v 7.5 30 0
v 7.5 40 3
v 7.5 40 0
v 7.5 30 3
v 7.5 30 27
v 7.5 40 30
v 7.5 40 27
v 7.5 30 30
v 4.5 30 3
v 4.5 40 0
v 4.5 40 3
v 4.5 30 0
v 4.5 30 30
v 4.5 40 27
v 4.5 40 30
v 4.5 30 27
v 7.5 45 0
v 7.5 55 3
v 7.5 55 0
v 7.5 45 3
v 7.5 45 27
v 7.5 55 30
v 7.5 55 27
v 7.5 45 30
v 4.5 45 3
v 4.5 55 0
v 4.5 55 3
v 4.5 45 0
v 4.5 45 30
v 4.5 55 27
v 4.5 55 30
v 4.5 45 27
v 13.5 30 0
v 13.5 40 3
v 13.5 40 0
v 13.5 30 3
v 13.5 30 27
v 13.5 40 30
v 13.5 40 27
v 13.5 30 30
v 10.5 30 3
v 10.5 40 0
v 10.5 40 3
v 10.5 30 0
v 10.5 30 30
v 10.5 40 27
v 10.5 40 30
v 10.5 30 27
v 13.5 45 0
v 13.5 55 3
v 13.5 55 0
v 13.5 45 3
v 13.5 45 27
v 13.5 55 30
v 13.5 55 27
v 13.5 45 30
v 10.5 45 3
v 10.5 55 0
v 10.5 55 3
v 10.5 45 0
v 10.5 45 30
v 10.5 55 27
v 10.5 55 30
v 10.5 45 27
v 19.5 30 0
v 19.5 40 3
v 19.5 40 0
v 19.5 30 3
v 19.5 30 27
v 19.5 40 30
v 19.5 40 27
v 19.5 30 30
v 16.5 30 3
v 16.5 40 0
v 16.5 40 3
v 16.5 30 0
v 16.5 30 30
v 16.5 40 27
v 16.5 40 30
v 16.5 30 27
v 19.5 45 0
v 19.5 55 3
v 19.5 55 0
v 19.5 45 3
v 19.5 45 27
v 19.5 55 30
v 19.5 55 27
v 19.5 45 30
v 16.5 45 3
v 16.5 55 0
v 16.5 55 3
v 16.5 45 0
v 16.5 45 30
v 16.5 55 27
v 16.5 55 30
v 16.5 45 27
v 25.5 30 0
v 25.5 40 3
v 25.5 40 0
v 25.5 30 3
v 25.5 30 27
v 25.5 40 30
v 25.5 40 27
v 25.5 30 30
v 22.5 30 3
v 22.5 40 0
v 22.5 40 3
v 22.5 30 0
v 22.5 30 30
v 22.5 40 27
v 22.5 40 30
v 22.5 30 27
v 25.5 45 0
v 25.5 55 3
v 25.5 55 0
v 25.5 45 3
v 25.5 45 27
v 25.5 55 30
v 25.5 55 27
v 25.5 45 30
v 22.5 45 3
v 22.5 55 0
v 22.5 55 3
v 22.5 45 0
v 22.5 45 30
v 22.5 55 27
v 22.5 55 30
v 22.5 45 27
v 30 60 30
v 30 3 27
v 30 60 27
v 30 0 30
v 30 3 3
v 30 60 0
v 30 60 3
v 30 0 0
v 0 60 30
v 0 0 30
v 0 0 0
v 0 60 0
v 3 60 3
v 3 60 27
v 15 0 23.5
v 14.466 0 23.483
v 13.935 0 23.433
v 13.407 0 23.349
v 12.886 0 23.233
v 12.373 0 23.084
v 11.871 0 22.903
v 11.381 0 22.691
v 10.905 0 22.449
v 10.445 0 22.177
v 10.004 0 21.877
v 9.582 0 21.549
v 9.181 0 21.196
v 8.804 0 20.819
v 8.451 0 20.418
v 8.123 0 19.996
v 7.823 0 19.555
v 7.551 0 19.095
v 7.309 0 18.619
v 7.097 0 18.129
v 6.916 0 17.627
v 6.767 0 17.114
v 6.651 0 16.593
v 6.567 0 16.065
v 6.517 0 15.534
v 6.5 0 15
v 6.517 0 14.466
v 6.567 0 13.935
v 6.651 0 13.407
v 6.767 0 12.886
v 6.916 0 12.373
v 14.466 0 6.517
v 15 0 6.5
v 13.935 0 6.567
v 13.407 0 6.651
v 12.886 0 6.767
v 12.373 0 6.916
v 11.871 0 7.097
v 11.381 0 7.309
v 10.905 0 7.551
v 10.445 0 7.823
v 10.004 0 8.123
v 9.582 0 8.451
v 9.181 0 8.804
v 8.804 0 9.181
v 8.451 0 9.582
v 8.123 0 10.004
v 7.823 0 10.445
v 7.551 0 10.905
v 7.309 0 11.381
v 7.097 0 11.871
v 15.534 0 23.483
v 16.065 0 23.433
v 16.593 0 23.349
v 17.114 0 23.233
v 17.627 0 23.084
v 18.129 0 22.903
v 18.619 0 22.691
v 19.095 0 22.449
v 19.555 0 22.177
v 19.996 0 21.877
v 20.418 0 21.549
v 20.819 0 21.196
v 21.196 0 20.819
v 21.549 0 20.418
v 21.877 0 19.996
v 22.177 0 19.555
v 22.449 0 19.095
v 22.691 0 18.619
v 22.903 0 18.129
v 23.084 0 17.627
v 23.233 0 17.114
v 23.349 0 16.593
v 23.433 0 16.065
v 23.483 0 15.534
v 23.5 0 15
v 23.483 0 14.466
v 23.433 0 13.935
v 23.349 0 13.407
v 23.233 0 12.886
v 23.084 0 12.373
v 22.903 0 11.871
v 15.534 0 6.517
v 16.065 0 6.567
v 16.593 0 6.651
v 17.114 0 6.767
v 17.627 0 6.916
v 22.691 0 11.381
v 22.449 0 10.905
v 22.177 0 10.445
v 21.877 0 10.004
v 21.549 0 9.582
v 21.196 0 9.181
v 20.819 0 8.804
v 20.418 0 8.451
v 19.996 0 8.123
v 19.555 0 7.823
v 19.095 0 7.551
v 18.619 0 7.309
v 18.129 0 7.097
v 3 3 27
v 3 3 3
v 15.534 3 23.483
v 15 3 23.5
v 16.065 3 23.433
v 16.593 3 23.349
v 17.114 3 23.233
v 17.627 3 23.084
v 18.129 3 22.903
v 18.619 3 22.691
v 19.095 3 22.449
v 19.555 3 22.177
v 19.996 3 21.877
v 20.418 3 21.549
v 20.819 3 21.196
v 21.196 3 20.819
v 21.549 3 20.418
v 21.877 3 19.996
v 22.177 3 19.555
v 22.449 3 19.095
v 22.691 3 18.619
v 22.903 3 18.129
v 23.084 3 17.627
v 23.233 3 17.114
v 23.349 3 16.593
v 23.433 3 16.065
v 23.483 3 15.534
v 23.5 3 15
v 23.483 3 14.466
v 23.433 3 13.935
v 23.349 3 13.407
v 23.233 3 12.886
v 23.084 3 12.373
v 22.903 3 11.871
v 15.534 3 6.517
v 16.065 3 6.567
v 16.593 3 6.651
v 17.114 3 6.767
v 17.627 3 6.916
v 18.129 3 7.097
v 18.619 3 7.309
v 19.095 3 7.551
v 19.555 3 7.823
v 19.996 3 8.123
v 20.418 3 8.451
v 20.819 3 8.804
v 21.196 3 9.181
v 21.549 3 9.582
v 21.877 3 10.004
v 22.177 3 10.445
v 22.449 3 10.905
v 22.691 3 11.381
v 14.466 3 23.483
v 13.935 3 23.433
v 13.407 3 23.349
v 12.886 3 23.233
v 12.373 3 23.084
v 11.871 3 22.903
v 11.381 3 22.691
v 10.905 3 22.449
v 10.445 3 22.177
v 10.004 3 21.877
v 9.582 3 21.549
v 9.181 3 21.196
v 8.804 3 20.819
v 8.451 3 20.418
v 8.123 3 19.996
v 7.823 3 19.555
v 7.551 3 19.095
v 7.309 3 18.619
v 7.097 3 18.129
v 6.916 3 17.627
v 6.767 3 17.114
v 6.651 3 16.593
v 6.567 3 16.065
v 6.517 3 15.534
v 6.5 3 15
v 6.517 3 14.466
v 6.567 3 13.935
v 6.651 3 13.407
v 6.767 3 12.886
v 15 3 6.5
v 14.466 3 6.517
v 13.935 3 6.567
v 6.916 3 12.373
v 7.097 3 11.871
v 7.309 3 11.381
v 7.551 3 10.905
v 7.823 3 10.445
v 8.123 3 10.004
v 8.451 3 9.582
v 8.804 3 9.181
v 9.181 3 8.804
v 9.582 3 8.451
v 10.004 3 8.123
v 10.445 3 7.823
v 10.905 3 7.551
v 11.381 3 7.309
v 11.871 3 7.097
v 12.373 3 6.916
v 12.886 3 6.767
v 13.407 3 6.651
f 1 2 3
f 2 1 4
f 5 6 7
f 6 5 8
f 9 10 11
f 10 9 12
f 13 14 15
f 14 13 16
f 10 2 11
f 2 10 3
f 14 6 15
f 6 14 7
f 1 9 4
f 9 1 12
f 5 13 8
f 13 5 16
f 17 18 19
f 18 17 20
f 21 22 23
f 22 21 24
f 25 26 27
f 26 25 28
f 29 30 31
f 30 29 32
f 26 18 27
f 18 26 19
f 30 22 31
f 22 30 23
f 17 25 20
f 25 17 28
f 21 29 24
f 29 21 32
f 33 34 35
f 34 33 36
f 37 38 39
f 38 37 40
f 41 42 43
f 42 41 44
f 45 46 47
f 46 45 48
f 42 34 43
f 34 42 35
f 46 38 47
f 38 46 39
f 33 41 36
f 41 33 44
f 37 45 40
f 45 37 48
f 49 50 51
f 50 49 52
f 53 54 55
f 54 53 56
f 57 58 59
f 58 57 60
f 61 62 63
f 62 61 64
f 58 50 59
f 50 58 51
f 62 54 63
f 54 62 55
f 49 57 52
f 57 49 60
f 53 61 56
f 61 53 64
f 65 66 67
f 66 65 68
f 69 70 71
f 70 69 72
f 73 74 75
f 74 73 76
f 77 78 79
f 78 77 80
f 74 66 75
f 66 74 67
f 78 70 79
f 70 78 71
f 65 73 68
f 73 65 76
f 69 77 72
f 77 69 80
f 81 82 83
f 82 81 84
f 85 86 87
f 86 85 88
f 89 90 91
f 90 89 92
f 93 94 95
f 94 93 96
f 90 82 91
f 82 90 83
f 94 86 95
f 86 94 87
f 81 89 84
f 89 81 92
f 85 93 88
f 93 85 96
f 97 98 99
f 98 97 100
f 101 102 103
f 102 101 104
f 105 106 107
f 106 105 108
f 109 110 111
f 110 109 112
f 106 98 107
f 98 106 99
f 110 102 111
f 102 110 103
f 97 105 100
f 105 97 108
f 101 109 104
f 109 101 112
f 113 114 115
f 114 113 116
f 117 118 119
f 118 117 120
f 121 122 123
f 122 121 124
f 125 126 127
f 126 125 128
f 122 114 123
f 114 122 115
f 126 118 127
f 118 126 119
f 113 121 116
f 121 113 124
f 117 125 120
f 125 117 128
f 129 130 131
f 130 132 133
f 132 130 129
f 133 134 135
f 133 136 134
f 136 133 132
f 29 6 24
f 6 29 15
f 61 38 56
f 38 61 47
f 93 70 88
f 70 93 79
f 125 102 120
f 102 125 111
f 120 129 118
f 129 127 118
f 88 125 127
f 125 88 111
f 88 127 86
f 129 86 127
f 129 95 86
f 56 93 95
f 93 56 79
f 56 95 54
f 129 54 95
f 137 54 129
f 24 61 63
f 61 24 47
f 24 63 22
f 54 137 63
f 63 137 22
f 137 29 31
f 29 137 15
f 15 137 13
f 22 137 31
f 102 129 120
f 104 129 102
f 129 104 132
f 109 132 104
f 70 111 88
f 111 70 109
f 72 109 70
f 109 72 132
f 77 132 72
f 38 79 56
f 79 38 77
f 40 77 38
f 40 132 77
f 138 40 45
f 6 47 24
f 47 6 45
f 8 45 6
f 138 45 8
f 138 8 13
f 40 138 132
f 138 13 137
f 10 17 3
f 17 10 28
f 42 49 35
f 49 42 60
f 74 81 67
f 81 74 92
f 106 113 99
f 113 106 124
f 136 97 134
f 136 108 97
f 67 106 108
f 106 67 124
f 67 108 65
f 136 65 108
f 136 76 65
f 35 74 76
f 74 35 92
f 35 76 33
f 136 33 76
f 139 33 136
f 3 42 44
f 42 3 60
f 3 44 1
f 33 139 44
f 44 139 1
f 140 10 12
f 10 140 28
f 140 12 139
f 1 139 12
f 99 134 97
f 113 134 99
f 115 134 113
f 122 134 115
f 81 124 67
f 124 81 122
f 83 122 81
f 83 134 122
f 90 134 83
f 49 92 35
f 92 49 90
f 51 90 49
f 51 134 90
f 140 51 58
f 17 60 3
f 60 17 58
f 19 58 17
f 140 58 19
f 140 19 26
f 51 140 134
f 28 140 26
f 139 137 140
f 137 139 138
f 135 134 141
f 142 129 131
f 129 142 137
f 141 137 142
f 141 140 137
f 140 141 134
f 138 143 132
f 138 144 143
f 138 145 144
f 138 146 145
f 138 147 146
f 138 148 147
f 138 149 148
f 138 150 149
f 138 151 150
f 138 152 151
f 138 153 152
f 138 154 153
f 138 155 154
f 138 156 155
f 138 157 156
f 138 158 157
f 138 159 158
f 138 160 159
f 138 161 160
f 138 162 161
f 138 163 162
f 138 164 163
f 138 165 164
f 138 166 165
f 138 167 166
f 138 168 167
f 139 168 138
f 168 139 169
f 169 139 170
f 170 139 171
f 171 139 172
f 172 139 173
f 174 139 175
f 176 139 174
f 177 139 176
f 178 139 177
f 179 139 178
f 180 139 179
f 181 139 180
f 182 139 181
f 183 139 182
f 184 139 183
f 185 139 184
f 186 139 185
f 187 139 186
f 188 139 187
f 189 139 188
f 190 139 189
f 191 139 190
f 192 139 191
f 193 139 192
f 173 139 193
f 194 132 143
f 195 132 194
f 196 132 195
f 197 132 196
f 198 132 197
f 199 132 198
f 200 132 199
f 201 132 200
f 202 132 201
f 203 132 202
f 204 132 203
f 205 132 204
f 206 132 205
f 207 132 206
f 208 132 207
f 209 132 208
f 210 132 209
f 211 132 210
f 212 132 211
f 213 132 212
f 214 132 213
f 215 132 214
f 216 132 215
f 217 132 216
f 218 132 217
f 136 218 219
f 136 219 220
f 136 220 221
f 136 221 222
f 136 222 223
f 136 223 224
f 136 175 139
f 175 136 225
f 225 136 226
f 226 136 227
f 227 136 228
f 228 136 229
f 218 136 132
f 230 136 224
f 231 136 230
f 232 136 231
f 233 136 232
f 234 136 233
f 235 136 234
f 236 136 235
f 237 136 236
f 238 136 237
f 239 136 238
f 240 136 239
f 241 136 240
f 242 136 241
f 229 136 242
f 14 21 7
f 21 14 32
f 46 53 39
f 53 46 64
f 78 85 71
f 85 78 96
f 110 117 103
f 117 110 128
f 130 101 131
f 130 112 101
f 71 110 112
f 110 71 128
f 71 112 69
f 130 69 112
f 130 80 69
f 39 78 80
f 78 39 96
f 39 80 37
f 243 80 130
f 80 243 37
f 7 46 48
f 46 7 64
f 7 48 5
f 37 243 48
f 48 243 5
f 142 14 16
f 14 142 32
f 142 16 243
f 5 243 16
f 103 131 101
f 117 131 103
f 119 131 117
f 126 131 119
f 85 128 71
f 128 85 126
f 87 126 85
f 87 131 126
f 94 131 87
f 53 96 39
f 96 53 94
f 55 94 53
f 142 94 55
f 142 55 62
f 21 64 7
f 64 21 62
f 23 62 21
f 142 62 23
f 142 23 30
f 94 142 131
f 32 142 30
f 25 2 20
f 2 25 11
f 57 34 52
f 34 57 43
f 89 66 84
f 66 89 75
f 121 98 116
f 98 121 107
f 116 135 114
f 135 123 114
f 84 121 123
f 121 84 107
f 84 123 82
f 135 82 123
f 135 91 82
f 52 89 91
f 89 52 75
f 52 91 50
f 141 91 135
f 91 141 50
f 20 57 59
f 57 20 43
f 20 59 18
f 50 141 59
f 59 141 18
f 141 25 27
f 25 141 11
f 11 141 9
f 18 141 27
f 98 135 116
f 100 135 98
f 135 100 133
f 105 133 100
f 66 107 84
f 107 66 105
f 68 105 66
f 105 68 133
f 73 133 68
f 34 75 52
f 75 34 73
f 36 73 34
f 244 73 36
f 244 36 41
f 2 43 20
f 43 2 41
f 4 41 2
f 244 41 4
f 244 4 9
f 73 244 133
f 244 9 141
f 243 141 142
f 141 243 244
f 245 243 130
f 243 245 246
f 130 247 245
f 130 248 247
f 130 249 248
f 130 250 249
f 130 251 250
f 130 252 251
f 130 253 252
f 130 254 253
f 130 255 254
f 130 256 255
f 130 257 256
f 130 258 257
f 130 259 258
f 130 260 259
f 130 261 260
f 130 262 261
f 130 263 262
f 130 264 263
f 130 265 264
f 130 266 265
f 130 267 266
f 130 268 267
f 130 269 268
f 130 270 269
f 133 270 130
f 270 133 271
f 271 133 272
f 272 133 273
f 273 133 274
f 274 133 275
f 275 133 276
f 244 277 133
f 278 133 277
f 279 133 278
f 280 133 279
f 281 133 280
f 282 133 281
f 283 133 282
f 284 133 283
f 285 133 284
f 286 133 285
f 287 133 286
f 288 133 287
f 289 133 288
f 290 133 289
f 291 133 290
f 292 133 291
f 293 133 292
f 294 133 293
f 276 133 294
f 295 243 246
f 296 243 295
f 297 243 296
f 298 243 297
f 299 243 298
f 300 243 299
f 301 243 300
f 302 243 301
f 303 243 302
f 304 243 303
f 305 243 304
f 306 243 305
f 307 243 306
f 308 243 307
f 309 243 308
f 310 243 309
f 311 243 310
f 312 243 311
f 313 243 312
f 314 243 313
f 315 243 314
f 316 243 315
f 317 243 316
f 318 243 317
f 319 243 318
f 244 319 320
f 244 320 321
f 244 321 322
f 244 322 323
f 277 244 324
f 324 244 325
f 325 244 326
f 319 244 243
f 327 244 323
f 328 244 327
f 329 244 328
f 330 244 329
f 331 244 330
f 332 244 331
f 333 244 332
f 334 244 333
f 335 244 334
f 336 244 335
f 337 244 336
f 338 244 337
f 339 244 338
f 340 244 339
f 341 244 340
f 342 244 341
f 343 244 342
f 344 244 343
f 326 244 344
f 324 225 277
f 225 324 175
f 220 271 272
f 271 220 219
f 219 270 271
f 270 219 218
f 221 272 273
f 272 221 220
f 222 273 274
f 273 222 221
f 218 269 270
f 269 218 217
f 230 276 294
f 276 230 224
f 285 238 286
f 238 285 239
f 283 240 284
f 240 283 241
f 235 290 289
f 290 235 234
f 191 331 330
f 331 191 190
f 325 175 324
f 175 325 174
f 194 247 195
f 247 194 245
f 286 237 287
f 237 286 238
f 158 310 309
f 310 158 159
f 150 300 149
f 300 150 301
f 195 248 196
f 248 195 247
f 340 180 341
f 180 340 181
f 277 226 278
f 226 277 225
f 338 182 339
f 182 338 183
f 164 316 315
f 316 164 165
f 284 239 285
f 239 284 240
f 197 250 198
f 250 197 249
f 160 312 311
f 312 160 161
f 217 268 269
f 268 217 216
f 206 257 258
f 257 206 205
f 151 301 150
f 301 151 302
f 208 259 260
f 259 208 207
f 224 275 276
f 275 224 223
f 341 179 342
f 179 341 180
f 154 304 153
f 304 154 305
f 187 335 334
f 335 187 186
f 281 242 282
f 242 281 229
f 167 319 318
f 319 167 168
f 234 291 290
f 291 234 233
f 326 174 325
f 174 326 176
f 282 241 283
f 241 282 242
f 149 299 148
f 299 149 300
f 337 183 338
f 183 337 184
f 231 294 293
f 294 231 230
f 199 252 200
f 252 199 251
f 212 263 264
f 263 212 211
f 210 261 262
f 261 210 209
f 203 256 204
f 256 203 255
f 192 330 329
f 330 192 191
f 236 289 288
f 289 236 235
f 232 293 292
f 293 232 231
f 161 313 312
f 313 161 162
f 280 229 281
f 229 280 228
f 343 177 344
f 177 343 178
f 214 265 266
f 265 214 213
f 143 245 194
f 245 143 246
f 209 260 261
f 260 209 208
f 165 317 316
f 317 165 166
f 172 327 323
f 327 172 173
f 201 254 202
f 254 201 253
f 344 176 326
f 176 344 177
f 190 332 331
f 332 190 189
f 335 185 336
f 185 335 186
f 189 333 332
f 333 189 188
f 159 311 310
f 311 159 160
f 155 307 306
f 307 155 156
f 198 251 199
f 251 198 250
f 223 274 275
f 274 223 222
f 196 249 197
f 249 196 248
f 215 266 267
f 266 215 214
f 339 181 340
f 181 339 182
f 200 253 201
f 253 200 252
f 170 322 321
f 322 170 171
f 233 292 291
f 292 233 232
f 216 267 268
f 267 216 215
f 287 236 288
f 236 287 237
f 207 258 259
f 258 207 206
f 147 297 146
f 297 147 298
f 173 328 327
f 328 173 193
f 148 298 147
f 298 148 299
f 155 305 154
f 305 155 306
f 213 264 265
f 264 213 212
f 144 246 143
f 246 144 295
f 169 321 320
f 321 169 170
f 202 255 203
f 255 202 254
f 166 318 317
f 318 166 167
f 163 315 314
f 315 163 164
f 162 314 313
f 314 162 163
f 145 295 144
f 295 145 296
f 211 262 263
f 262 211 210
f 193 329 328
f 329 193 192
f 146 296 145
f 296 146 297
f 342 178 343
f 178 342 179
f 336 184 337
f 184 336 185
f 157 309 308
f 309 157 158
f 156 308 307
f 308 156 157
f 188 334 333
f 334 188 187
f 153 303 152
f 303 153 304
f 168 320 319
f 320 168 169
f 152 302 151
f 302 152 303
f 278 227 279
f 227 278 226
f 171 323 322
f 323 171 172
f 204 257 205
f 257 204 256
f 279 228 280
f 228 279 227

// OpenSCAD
// aviation_power_socket.scad

difference(){
  // base shape of object
  translate([0,0,0]){
    cube([30,60,30]);
  }
  // main cavity of object
  translate([3,3,3]){
    cube([24,57.1,24]);
  }
  // side cutaway of object
  translate([26,3,3]){
    cube([4.1,57.1,24]);
  }
  // hole for 16mm aviation socket
  translate([15,-1,15]){
    rotate([-90,0,0]){
      cylinder($fn=100,h=4.2,r=8.5);
    }
  }
  // cable comb holes for zip ties
  for(x=[4.5,10.5,16.5,22.5]){
    for(y=[30,45]){
      translate([x,y,-.1]){
        cube([3,10,30.2]);
      }
    }
  }
}
